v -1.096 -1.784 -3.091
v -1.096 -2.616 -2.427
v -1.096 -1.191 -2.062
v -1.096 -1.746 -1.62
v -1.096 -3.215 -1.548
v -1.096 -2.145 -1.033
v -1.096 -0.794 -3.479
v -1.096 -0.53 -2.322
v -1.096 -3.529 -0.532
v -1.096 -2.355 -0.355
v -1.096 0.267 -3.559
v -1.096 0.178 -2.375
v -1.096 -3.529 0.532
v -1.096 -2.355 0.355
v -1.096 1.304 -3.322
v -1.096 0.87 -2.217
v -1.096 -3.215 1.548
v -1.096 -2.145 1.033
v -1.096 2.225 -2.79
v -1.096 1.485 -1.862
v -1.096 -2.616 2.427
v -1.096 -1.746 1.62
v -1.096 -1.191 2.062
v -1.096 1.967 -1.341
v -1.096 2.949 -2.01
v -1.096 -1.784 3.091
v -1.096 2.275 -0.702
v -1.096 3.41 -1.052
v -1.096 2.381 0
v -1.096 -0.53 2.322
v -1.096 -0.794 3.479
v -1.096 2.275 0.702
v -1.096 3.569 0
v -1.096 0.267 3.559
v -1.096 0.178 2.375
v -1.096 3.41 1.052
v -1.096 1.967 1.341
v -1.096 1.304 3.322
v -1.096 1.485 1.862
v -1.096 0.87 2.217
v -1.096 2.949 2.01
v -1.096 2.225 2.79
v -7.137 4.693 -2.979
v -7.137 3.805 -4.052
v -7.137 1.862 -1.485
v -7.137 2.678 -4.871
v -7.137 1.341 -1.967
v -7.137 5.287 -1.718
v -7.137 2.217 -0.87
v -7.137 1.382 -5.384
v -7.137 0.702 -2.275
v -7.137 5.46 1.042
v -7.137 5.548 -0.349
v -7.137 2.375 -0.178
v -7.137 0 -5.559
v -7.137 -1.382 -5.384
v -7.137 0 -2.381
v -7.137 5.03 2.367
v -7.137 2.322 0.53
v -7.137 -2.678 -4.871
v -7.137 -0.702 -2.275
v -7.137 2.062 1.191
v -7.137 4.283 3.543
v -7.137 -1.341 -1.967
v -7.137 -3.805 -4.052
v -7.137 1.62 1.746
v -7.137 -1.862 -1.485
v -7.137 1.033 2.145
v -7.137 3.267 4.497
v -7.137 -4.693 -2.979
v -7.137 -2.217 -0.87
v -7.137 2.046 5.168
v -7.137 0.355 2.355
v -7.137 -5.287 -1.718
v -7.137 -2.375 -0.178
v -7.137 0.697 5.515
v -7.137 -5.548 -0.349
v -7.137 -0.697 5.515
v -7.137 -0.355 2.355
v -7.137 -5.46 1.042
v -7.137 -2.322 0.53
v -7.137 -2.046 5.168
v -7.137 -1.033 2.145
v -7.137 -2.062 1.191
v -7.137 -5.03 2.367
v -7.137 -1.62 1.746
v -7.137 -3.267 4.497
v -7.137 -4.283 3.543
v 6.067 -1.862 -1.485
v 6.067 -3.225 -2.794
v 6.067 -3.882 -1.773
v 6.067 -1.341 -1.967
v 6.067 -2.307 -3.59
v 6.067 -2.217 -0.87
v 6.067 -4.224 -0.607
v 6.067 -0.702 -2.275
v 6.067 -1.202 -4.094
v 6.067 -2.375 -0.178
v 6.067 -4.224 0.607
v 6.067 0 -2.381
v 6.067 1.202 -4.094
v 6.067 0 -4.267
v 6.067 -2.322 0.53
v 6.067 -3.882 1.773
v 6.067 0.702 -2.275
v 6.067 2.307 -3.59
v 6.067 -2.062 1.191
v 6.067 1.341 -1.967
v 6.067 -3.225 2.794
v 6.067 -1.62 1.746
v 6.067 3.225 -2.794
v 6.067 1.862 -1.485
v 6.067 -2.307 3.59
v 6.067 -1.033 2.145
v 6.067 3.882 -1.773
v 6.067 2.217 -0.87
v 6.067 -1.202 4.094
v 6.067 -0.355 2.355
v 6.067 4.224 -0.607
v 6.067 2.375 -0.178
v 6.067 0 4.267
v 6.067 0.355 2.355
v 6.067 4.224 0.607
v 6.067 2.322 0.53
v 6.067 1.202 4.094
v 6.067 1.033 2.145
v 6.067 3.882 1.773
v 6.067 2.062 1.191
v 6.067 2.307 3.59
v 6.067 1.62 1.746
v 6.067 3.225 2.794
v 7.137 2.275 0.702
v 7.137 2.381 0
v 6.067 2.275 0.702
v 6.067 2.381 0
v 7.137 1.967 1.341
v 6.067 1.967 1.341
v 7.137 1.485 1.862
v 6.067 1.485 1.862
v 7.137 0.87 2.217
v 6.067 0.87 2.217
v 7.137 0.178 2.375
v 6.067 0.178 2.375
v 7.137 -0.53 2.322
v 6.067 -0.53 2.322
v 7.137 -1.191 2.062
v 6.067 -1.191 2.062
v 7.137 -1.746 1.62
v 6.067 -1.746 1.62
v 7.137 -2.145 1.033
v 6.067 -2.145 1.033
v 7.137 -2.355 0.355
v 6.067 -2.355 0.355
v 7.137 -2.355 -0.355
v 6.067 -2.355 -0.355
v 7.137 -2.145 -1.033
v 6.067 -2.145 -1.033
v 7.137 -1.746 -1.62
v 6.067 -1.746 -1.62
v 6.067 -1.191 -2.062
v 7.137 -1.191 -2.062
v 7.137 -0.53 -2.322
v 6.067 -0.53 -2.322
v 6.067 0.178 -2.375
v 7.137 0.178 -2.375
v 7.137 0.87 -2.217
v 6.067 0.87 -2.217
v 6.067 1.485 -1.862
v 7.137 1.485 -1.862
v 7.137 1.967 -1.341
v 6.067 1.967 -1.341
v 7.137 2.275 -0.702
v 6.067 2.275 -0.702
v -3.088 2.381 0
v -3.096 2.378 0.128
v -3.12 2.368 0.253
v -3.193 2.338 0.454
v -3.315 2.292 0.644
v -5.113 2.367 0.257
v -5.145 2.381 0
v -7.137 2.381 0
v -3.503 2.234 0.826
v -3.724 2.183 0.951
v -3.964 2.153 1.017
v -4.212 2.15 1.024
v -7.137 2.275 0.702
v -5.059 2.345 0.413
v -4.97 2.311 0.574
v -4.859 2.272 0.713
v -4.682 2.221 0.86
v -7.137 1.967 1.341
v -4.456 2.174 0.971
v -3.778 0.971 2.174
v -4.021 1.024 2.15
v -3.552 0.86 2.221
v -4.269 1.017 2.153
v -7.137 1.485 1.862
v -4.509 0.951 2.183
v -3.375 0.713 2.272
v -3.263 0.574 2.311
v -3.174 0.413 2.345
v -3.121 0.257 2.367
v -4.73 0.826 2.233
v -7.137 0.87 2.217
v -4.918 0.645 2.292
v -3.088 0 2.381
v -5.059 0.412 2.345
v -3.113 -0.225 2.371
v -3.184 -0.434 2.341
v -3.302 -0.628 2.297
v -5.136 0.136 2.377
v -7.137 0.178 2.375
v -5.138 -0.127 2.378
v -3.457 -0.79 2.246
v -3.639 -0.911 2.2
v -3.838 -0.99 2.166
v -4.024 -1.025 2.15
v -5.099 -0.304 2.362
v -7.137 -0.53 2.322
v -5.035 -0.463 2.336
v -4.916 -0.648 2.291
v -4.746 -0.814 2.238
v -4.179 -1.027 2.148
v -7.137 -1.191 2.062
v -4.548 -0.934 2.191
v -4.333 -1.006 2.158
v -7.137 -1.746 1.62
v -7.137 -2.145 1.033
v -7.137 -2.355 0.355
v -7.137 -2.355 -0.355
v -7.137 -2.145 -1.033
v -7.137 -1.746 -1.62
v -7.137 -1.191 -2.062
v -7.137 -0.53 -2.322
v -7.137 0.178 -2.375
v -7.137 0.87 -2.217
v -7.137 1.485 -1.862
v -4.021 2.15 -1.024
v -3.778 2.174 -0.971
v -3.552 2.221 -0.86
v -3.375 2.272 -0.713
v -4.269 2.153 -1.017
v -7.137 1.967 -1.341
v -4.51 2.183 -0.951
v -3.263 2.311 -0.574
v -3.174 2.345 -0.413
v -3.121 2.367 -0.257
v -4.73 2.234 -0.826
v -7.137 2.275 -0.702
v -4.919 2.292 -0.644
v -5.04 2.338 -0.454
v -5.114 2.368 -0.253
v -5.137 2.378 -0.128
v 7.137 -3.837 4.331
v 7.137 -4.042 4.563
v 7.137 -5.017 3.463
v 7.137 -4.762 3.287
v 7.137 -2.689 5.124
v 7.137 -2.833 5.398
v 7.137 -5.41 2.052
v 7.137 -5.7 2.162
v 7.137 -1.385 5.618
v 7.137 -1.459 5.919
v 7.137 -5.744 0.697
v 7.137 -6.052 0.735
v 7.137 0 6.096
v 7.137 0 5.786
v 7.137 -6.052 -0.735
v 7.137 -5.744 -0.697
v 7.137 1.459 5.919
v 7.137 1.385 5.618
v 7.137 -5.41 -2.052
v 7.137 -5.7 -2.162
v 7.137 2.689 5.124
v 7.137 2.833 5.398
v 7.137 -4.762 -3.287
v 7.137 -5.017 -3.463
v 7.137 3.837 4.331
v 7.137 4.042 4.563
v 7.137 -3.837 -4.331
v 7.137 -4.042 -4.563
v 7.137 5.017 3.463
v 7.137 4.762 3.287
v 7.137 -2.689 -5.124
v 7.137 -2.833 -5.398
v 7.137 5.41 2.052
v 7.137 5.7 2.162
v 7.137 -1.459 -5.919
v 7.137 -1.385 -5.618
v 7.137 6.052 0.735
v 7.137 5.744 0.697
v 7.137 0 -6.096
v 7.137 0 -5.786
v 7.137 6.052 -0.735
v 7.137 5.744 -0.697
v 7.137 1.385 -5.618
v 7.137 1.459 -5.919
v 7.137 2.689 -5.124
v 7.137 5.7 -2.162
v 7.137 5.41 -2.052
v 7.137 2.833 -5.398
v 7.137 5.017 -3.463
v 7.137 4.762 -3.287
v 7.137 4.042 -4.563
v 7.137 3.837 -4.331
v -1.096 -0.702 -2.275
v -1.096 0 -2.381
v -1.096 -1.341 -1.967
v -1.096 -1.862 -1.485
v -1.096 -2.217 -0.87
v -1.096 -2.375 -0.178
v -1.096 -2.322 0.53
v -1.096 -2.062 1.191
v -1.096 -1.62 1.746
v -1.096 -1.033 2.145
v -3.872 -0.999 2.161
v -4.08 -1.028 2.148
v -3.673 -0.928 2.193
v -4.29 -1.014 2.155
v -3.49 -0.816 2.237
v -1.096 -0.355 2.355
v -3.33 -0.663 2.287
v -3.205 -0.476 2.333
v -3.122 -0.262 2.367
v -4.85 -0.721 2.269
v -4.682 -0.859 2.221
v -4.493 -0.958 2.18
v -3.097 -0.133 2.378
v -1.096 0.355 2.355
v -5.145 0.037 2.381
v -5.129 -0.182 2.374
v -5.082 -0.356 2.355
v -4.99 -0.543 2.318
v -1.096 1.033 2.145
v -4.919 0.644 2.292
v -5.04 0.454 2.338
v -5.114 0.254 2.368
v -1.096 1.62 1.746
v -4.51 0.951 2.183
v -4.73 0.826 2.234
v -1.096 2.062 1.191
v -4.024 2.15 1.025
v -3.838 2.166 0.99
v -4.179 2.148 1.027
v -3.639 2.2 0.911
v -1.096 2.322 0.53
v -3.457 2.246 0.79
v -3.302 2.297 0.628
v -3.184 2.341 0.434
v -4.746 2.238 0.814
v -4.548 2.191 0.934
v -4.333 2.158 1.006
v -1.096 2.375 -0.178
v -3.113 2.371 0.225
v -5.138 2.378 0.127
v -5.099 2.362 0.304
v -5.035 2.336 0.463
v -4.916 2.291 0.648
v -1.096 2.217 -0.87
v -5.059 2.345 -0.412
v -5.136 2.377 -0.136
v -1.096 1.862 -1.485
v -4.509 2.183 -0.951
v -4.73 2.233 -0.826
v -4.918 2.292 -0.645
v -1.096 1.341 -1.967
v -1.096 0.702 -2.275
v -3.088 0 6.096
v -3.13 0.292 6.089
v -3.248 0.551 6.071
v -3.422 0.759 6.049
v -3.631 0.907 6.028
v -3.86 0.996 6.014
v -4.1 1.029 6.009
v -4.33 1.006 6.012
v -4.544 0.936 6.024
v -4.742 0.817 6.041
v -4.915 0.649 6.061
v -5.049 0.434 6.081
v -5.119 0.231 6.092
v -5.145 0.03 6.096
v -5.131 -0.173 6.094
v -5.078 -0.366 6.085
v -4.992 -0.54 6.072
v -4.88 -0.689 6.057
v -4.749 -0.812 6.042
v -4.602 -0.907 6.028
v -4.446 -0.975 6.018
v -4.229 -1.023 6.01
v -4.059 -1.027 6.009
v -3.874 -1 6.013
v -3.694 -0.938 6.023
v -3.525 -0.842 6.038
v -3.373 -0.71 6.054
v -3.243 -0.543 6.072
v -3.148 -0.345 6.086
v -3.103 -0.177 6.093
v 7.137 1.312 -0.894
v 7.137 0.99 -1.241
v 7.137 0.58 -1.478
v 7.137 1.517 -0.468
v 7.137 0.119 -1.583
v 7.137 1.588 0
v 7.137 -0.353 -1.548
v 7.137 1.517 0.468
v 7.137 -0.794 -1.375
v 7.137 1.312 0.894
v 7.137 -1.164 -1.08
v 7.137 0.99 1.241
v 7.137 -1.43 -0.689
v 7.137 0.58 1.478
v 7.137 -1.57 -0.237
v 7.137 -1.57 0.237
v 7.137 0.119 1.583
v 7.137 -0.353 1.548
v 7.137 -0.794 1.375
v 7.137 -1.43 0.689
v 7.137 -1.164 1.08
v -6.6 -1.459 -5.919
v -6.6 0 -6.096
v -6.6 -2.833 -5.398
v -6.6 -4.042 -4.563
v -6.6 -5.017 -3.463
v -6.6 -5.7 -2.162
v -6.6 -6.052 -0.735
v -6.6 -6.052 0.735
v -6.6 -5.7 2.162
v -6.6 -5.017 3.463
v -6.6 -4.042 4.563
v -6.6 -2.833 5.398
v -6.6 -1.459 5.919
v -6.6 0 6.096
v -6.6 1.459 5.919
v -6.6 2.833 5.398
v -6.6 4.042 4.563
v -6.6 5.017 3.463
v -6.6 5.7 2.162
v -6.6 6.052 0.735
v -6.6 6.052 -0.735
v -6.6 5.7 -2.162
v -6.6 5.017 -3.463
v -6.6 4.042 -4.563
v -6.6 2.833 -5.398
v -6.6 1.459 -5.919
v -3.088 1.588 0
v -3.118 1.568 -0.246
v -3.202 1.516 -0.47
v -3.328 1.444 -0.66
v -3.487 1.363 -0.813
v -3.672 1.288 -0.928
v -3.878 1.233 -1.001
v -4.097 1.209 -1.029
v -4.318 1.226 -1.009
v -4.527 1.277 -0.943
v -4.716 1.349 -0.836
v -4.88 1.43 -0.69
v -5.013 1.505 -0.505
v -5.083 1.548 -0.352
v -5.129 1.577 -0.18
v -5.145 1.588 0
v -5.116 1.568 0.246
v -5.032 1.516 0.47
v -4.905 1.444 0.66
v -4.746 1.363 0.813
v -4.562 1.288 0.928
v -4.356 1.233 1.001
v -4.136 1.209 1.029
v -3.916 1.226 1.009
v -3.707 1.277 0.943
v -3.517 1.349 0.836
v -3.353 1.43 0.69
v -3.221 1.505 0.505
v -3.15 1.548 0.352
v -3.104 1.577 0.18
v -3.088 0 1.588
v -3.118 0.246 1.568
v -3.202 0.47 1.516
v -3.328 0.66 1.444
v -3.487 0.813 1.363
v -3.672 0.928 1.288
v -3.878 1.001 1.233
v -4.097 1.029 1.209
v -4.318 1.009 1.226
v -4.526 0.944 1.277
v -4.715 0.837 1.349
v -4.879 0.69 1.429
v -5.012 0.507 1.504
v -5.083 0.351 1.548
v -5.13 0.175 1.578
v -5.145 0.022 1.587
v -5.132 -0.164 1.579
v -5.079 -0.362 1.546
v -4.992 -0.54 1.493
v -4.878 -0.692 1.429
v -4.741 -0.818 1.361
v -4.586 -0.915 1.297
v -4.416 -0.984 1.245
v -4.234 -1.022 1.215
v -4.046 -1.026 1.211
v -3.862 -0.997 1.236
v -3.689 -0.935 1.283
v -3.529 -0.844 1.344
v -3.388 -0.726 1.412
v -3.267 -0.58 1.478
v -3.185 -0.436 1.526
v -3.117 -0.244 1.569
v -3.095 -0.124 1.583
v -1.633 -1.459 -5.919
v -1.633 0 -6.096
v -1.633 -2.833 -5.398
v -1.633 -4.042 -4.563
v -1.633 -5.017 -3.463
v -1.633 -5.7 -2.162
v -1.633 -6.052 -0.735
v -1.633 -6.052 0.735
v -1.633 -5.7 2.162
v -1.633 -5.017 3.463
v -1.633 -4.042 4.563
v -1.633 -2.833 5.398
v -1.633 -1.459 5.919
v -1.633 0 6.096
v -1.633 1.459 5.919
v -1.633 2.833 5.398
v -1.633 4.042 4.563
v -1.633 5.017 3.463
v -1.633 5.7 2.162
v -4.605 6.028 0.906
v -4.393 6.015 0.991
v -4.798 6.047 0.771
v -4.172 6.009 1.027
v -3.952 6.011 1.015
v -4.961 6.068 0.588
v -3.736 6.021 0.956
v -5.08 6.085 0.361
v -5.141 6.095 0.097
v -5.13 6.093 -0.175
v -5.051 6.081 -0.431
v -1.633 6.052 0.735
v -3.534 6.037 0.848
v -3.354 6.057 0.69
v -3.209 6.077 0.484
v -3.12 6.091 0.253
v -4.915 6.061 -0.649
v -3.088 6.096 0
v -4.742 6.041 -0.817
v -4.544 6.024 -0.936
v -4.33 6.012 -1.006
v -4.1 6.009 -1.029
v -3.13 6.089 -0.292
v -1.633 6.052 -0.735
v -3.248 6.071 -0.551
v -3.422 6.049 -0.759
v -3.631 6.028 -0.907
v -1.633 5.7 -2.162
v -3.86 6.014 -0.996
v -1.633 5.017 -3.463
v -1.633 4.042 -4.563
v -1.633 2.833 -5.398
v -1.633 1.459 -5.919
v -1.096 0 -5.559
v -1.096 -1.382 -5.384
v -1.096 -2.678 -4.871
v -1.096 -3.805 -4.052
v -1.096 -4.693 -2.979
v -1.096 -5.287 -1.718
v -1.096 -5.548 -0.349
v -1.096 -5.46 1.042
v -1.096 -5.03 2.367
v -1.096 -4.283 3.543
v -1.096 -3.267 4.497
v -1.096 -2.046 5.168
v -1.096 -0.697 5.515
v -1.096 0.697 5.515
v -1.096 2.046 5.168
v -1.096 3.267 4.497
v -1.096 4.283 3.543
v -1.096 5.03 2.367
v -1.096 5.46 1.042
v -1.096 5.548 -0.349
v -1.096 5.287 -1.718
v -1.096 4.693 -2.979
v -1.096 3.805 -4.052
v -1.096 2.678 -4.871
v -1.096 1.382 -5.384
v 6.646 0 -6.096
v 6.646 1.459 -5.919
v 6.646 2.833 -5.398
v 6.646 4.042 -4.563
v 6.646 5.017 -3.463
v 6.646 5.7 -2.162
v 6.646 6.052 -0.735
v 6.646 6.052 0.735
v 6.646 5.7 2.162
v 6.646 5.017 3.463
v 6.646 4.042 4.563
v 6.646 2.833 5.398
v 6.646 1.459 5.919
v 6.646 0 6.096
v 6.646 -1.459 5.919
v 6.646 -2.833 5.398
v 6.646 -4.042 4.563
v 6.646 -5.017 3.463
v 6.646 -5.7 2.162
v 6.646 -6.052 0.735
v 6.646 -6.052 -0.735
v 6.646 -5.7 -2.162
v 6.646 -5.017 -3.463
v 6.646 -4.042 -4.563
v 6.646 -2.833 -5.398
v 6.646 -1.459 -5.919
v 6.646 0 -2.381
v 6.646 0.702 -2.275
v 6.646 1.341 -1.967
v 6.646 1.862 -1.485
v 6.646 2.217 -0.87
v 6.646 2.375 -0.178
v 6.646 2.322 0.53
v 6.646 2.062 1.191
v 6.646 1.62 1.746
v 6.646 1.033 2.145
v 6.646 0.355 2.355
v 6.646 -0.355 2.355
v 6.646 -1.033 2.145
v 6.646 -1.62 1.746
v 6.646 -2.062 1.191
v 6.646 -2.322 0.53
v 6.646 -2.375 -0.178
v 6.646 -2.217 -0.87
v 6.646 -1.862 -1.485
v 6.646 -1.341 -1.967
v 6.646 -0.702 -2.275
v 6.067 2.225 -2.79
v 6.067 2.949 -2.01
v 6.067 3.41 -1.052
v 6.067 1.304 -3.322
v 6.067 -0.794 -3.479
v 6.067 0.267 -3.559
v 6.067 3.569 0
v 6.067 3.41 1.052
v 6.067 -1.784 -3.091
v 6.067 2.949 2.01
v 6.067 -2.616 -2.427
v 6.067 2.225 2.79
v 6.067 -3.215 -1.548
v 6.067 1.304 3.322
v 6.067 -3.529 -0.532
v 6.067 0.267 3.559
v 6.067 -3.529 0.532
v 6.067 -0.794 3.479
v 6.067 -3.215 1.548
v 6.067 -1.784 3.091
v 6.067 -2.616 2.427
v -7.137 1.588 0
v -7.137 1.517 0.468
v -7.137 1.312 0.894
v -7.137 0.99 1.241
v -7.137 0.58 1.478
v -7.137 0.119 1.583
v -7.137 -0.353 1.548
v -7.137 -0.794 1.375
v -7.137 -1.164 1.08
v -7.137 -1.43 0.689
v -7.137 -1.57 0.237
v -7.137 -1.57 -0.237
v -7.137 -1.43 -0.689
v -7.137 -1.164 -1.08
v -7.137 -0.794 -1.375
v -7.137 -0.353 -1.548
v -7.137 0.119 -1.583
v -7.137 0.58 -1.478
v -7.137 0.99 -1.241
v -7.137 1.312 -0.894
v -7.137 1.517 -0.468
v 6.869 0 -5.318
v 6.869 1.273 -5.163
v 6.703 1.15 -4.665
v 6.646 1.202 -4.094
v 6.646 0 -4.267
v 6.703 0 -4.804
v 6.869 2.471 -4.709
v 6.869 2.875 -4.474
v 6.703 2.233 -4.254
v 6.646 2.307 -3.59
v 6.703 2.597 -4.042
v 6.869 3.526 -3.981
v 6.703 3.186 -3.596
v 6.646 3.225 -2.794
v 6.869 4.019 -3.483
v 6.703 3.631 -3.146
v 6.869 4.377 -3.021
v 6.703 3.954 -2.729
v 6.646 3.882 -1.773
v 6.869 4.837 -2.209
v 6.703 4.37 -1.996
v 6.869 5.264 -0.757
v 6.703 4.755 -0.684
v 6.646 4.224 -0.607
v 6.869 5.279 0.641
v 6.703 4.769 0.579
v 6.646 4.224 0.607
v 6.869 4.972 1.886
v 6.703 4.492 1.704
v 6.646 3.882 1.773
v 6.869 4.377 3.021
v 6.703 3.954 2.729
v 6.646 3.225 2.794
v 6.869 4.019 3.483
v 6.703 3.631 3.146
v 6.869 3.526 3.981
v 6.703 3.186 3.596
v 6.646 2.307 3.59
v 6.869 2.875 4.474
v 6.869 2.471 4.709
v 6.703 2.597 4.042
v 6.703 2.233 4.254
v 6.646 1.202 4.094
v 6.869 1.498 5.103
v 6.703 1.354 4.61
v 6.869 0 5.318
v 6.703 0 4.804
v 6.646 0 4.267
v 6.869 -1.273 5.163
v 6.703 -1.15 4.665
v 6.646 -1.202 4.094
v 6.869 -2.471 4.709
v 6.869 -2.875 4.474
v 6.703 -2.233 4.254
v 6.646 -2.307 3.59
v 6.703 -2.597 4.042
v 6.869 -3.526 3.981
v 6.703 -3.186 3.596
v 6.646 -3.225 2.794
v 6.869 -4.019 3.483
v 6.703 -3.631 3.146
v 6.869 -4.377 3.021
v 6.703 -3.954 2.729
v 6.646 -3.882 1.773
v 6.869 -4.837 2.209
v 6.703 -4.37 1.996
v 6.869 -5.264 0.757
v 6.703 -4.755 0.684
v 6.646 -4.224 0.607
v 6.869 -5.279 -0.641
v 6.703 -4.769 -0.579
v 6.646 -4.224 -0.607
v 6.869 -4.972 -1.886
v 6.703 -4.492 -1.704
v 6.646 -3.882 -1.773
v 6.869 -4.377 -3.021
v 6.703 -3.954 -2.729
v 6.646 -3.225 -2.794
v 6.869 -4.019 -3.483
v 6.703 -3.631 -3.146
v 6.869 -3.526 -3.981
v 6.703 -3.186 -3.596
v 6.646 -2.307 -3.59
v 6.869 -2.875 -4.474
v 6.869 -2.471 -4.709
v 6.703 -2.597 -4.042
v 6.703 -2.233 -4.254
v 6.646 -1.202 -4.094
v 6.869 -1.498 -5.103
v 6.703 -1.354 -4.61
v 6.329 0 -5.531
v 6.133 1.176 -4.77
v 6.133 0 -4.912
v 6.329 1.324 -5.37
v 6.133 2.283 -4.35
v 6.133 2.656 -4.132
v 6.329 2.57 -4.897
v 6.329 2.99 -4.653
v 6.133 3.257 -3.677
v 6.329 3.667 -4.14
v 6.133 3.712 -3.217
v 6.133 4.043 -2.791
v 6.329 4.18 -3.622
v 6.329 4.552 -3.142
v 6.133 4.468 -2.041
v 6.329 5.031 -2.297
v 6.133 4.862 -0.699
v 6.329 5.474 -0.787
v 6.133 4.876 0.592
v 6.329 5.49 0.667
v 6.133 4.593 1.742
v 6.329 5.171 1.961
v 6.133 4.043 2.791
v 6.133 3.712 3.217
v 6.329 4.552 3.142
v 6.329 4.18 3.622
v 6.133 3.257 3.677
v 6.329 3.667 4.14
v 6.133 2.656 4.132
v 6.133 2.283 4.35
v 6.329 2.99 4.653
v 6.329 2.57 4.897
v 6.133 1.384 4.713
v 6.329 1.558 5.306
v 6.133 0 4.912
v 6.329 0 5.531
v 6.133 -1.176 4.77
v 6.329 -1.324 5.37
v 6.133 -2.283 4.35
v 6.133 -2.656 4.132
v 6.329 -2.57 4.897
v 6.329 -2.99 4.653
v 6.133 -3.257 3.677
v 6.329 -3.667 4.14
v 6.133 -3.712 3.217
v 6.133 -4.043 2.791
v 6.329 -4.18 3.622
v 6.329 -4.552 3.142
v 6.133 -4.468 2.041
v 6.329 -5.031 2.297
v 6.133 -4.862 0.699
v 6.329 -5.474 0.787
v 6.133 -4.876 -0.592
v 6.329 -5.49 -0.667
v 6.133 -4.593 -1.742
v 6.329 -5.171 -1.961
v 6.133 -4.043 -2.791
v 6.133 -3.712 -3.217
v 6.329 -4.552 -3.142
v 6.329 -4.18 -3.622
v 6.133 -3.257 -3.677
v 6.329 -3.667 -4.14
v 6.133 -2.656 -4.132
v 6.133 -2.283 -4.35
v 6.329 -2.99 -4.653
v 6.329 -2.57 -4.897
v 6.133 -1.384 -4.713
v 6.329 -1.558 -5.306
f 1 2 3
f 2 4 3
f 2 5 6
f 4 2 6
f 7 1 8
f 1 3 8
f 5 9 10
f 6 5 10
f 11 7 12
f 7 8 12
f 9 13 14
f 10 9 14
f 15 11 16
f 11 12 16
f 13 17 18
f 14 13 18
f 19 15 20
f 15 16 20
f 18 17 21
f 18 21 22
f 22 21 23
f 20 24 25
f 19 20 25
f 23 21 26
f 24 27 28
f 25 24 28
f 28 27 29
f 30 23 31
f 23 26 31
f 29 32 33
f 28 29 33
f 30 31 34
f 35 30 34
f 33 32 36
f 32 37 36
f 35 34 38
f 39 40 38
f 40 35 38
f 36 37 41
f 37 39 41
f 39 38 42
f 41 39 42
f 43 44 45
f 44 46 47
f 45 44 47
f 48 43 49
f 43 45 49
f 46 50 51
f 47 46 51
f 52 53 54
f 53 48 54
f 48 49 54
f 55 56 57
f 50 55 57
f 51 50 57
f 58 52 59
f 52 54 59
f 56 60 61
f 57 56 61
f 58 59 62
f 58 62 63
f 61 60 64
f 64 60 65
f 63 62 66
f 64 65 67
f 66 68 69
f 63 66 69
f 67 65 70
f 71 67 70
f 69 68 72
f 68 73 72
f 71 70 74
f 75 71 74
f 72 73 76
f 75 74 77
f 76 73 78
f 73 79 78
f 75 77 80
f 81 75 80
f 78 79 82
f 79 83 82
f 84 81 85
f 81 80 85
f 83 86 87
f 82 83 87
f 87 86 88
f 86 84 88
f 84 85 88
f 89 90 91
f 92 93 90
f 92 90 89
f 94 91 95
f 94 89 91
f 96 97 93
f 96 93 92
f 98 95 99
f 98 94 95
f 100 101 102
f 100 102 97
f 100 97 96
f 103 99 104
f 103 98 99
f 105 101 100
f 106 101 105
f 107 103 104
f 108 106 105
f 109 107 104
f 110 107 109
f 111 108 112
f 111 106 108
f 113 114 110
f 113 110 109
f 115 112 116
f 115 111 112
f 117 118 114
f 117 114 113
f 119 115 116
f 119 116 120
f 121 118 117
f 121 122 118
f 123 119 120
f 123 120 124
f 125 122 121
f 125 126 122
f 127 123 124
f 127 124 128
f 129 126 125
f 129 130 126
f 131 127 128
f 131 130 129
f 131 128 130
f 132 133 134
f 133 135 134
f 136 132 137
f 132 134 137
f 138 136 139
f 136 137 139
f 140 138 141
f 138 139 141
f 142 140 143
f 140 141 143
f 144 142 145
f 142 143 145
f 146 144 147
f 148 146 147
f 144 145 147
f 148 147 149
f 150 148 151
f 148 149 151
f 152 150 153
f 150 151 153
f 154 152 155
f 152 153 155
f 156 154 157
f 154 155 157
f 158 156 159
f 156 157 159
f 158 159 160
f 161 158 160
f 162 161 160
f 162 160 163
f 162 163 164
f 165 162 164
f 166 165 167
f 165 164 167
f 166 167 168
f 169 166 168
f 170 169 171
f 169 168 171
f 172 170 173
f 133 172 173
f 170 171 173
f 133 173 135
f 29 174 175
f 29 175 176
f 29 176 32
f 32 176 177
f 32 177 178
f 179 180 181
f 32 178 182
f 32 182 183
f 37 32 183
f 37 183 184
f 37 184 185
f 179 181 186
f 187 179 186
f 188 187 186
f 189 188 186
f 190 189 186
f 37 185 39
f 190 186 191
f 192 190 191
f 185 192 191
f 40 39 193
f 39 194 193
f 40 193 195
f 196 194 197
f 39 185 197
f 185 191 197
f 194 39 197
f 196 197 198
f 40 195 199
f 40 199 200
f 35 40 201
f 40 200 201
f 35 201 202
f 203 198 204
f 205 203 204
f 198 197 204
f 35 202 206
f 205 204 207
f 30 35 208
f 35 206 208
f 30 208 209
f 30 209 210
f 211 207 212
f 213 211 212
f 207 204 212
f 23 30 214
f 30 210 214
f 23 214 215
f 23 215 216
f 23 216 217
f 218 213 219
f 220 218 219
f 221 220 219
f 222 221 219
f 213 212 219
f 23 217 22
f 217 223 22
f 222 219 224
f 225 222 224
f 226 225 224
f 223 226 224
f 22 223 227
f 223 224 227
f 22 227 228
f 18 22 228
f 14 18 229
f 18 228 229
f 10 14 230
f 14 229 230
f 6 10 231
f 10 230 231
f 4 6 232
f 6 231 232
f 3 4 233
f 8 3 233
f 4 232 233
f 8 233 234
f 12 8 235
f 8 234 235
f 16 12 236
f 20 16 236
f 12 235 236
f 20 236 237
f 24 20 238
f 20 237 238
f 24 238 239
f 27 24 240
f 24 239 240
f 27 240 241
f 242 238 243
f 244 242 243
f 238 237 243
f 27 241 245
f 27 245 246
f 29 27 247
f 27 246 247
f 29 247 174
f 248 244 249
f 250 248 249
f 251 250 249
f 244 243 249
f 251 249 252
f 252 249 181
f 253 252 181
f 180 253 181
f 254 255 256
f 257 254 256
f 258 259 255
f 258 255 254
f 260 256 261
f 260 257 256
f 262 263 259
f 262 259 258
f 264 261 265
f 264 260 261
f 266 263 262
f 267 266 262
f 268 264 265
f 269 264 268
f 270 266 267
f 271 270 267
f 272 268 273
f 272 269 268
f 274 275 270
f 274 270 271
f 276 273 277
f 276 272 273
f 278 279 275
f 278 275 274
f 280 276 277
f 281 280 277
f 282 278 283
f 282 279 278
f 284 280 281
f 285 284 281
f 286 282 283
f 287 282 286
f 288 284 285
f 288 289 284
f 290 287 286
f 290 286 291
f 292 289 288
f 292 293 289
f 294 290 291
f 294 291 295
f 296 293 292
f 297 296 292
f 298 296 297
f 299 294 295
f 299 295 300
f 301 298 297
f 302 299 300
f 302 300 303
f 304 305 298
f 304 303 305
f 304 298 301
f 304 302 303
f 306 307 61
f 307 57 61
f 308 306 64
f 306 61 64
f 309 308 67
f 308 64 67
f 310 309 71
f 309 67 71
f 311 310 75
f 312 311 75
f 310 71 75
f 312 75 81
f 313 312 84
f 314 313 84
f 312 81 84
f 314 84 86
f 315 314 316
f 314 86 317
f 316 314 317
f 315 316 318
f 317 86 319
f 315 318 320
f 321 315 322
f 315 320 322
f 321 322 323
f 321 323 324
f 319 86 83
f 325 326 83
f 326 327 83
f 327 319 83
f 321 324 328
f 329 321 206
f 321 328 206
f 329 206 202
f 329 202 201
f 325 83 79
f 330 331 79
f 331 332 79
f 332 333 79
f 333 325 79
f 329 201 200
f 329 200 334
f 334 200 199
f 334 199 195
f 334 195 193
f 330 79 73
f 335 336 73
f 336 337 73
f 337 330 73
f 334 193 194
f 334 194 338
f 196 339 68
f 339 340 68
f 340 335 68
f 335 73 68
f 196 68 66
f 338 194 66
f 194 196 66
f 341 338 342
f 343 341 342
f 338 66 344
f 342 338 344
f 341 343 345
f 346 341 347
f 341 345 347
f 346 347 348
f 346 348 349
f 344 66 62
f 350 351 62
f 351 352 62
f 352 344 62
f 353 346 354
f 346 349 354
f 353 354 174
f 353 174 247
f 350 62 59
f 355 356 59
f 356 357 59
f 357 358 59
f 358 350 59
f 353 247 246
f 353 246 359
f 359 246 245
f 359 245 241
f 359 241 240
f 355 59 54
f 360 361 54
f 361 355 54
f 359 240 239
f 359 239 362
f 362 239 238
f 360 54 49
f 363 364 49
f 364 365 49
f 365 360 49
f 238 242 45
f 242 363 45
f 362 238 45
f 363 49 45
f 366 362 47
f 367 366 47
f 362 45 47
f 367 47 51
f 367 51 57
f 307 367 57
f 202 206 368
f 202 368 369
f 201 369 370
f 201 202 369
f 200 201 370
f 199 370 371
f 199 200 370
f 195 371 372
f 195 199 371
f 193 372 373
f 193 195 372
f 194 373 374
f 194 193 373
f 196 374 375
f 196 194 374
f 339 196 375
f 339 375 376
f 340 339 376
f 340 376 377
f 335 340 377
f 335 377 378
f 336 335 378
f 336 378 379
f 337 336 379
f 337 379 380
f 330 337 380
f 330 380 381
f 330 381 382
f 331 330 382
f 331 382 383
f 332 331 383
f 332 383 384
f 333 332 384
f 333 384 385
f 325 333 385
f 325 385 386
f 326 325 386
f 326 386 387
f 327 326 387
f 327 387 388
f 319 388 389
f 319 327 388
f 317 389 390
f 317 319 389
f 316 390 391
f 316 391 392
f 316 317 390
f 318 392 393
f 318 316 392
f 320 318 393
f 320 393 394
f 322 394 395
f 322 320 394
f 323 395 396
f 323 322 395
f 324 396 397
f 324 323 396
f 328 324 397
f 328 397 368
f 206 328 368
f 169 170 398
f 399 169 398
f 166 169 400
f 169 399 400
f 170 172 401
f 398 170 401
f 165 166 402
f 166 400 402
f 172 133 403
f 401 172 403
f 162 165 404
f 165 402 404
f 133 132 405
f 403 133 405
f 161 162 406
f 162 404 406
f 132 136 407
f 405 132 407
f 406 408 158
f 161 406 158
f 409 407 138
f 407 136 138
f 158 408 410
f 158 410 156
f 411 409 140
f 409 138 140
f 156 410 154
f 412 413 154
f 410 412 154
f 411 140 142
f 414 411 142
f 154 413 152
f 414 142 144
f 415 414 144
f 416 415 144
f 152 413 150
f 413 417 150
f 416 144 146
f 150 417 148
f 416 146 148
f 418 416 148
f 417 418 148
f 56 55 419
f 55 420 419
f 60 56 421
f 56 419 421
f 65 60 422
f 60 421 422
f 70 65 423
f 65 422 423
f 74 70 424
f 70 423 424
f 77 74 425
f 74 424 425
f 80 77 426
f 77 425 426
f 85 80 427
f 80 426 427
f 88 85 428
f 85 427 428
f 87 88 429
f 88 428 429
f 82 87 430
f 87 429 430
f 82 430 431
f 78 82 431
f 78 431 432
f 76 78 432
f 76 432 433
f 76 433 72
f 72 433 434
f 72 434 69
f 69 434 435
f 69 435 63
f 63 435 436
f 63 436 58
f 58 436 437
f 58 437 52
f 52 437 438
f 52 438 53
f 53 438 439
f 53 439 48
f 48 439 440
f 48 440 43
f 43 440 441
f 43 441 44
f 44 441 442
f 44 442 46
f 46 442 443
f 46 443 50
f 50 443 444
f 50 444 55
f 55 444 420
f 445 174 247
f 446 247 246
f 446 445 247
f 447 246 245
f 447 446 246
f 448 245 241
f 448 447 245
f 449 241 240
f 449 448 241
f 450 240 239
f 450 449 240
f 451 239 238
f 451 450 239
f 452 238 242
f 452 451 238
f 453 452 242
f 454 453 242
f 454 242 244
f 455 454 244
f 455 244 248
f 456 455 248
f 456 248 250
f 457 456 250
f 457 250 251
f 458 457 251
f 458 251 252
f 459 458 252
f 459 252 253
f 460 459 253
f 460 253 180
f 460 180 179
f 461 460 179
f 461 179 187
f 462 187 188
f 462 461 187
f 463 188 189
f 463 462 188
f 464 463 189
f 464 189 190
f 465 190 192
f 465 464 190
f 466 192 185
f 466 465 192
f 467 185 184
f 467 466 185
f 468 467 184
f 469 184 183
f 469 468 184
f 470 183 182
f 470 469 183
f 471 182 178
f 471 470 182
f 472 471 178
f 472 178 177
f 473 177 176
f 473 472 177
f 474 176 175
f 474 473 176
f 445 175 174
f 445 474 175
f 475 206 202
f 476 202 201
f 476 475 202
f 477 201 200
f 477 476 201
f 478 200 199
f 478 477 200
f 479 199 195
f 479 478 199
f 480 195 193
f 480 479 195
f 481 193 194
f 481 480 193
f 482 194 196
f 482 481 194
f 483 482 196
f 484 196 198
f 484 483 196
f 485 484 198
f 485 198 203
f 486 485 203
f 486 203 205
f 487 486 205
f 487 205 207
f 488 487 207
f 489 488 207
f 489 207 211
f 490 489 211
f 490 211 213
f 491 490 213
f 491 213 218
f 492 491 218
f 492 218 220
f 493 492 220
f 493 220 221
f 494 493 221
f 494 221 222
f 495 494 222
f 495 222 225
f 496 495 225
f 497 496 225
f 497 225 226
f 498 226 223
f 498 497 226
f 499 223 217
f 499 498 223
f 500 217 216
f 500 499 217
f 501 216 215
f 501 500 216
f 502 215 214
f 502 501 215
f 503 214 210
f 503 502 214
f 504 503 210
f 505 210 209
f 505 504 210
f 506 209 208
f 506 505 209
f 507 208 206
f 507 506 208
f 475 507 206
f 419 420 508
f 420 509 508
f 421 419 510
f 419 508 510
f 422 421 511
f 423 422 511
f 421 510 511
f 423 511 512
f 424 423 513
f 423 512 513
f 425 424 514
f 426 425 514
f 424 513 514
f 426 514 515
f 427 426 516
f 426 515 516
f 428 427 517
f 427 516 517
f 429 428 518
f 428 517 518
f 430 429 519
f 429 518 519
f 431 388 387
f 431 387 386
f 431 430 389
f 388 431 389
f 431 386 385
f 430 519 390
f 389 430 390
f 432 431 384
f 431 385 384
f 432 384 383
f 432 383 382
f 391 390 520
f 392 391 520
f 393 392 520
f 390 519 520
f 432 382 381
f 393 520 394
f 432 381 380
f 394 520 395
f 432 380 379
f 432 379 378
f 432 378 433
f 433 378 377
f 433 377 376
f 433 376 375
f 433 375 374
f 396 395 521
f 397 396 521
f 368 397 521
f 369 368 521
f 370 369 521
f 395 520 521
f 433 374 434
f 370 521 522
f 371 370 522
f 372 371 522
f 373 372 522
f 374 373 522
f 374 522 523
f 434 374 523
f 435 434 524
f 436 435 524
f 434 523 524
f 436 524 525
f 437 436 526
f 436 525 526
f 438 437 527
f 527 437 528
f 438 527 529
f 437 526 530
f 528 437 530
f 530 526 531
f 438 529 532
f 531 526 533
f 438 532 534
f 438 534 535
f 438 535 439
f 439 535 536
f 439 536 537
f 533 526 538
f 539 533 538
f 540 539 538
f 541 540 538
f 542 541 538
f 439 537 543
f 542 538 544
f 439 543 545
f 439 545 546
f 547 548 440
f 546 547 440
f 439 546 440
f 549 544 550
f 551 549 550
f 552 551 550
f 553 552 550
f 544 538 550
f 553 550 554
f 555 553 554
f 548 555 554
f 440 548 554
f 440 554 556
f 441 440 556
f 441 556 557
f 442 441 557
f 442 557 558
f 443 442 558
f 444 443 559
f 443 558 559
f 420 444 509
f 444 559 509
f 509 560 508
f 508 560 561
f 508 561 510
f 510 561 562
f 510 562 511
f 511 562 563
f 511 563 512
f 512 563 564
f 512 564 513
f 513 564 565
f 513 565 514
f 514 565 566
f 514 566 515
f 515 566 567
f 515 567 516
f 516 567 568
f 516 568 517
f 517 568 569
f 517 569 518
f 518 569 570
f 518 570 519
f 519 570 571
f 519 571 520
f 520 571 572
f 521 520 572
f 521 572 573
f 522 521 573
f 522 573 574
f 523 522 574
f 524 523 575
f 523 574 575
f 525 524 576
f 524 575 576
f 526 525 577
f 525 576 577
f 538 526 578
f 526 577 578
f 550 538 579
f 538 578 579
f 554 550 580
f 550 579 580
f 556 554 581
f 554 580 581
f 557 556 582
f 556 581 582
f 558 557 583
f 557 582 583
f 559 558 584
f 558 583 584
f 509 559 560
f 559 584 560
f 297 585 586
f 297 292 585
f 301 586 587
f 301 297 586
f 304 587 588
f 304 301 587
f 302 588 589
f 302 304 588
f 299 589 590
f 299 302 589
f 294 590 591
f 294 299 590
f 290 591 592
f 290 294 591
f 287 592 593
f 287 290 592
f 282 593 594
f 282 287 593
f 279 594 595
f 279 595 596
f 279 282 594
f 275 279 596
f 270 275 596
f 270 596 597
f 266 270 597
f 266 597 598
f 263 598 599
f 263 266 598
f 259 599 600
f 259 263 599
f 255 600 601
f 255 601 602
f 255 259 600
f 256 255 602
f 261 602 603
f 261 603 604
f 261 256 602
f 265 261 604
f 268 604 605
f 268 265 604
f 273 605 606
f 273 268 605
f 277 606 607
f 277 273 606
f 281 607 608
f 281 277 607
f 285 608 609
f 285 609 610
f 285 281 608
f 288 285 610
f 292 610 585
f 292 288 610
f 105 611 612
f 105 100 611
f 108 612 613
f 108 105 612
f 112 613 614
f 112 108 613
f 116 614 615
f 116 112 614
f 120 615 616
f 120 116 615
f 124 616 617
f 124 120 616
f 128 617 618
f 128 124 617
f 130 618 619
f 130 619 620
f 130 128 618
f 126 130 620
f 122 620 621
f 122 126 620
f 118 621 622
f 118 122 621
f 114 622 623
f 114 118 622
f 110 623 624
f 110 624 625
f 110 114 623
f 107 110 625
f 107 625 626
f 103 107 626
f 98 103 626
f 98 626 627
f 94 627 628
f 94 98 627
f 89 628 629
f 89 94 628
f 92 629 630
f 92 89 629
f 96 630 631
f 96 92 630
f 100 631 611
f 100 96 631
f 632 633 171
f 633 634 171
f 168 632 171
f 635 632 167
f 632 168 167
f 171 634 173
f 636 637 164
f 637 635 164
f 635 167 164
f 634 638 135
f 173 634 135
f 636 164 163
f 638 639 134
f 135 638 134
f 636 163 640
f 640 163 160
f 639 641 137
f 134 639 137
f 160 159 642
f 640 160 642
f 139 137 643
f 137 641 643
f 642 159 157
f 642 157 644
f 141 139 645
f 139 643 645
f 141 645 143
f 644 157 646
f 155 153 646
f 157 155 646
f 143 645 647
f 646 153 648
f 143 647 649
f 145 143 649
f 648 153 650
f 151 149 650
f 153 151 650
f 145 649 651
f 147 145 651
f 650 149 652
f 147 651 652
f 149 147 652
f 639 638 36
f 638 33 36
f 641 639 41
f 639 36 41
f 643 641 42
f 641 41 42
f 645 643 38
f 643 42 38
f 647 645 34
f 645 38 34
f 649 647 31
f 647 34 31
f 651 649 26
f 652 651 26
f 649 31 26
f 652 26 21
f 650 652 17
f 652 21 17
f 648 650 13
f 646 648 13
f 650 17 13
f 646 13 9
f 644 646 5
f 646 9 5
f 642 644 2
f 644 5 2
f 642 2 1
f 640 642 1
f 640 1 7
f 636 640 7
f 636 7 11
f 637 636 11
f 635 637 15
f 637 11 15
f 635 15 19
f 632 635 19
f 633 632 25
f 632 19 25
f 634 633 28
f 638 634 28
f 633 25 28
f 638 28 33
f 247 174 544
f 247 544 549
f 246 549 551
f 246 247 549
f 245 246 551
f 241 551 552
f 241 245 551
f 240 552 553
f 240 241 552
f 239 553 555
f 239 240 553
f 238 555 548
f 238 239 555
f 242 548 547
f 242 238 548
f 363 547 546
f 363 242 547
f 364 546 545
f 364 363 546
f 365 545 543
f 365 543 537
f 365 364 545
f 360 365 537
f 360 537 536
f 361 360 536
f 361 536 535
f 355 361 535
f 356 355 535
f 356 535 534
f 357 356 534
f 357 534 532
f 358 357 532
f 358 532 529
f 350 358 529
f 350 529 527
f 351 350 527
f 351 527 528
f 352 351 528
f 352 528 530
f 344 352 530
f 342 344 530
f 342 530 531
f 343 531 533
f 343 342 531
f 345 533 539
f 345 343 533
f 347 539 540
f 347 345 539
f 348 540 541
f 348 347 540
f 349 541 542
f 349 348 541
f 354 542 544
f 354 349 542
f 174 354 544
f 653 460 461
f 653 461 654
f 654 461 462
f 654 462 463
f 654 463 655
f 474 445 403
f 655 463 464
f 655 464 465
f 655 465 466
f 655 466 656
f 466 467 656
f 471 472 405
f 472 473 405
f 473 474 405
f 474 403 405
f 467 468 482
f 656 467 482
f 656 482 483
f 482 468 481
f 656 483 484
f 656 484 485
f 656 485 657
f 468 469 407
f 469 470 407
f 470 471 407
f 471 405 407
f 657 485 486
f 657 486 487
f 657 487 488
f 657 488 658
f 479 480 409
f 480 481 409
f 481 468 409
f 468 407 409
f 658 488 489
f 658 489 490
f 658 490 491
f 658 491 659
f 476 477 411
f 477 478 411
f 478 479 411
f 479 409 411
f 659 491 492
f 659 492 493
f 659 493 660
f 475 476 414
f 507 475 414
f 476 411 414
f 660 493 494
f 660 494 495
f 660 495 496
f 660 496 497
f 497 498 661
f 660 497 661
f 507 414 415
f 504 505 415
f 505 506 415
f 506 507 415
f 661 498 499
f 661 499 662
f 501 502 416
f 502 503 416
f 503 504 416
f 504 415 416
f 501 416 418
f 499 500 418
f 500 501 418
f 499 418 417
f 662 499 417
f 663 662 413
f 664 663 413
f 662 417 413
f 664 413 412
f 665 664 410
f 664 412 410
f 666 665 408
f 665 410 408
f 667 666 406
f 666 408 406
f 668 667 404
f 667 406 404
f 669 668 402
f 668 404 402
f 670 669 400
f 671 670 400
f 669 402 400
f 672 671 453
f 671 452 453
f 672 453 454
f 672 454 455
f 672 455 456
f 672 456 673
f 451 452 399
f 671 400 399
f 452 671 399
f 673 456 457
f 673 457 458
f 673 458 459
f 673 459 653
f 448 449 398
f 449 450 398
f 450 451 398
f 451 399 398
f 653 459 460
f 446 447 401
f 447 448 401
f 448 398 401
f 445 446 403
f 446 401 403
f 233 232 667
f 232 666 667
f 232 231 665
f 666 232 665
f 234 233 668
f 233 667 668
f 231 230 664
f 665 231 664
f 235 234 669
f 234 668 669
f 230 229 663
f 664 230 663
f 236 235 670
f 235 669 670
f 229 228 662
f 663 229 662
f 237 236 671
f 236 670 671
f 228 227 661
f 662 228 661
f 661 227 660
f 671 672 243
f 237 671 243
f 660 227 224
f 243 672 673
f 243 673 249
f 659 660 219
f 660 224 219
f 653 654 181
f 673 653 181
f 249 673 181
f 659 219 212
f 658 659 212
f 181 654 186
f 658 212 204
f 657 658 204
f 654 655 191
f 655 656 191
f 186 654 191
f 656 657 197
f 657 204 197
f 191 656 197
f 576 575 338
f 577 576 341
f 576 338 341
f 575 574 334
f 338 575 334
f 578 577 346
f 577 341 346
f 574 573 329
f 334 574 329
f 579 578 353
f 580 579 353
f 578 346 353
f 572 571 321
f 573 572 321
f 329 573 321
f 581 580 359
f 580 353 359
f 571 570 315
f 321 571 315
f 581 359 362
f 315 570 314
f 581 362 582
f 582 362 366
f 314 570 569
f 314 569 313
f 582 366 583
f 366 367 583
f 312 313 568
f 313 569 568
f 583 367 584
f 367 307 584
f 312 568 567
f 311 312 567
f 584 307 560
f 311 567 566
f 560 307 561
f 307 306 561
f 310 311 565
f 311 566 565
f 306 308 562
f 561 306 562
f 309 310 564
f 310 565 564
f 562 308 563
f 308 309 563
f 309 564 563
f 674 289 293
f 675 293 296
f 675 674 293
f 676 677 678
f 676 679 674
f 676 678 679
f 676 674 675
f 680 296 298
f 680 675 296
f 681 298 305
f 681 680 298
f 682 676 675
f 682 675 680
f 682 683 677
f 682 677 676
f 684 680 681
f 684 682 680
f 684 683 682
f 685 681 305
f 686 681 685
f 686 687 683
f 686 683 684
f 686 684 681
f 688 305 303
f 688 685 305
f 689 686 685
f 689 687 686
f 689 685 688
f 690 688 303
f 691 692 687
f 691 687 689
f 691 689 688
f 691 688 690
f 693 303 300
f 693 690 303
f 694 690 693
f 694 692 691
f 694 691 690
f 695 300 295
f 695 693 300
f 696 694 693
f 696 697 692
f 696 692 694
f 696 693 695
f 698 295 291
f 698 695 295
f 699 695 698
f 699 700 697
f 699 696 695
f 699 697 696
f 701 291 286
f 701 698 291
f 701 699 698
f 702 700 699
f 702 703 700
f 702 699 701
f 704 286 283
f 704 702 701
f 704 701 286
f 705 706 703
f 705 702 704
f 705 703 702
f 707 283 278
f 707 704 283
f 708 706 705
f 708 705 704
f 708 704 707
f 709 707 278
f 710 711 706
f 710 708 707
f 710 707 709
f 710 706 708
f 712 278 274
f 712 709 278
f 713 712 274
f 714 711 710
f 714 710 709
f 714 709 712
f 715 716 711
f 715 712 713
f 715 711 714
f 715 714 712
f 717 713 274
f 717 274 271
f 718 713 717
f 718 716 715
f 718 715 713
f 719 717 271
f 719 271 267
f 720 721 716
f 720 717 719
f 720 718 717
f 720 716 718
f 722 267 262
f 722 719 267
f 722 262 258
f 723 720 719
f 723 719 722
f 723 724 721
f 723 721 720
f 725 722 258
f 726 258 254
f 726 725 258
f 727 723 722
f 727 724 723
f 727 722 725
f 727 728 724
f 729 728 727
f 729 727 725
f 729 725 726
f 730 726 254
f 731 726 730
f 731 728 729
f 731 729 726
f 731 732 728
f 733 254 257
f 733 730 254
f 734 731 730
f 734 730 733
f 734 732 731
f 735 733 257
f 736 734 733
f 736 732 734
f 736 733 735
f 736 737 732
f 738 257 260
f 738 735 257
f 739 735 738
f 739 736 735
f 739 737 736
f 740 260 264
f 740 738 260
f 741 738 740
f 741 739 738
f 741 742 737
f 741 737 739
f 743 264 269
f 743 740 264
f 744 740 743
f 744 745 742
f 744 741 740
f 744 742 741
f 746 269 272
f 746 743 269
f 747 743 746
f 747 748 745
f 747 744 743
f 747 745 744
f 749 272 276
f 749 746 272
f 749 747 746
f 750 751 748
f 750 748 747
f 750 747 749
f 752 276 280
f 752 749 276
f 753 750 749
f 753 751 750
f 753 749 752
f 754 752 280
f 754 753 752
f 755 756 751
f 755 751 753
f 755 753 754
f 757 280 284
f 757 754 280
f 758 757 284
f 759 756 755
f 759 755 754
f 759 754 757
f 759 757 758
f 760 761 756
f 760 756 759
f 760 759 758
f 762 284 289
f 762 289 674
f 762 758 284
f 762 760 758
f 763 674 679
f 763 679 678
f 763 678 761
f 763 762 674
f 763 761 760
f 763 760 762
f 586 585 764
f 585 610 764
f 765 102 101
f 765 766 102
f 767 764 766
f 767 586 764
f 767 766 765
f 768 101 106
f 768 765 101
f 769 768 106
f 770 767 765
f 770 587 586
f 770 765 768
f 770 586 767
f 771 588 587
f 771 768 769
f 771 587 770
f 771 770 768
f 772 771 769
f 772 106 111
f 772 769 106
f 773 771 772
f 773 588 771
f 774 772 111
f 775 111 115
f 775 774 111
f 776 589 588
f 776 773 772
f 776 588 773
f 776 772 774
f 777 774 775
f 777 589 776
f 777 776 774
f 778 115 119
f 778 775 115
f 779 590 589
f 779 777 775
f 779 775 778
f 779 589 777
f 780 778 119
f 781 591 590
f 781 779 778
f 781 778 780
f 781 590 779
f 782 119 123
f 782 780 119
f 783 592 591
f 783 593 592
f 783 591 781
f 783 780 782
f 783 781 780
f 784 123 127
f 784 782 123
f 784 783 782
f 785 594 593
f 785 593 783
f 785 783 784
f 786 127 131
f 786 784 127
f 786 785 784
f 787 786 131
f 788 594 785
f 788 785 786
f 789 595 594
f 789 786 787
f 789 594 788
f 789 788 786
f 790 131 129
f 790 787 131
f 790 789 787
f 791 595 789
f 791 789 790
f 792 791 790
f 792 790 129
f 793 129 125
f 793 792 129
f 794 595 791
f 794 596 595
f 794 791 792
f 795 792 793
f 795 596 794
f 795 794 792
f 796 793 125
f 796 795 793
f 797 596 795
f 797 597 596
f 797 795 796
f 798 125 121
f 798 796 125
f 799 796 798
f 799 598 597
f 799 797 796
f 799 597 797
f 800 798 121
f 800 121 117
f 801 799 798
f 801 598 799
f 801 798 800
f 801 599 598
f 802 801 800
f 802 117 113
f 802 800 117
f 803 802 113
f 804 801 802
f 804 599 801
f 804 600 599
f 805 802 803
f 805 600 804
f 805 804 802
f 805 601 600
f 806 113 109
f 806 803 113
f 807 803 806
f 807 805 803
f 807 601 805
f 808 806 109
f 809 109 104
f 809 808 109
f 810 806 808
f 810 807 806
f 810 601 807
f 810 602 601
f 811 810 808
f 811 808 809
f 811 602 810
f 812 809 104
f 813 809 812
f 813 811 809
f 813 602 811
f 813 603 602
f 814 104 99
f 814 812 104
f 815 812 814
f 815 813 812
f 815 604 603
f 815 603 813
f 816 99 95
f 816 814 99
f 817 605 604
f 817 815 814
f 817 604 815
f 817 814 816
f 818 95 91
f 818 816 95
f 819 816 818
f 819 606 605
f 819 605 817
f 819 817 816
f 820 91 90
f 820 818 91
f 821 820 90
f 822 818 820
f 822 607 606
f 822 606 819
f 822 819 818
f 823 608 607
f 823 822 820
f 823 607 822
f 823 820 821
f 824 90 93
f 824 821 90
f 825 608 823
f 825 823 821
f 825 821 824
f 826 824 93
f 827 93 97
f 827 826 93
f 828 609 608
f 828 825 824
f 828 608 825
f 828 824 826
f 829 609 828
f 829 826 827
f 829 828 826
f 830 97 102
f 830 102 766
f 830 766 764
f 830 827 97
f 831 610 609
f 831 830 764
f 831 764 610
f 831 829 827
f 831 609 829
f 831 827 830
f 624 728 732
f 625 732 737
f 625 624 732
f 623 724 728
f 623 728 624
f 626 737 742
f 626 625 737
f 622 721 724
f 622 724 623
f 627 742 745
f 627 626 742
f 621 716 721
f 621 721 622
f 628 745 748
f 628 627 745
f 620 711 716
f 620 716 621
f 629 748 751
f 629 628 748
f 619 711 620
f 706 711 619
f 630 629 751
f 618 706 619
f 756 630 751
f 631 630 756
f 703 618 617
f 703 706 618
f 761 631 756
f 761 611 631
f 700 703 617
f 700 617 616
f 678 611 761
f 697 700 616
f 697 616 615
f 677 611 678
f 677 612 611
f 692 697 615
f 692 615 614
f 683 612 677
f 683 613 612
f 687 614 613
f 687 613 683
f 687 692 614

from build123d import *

# Parameters (mm, degrees)
SKETCH5_R         = 1.0287
SET_SCREWS_DEPTH  = 10
CIRPATTERN1_COUNT = 2
CIRPATTERN1_ANGLE = 90


with BuildPart() as part:
    # Sketch2 → Base Body (revolve)
    with BuildSketch(Plane.XY):
        Polygon((-7.1374, 1.5875), (7.1374, 1.5875), (7.1374, 2.38125), (6.06679, 2.38125), (6.06679, 3.5687), (-1.09601, 3.5687), (-1.09601, 2.38125), (-7.1374, 2.38125), align=None)
    revolve(axis=Axis((-7.1374, 0, 0), (1, 0, 0)))


with BuildPart() as body_2:
    # Sketch3 → Hub (revolve)
    with BuildSketch(Plane(origin=(0, 0, 0), x_dir=(1, 0, 0), z_dir=(0, 1, 0))):
        Polygon((-1.09601, 2.38125), (-7.1374, 2.38125), (-7.1374, 5.55879), (-6.60019, 6.096), (-1.63322, 6.096), (-1.09601, 5.55879), align=None)
    revolve(axis=Axis((0, 0, 0), (-1, 0, 0)))


with BuildPart() as body_3:
    # Sketch4 → Flange (revolve)
    with BuildSketch(Plane(origin=(0, 0, 0), x_dir=(1, 0, 0), z_dir=(0, 1, 0))):
        with BuildLine():
            Line((6.06679, 2.38125), (6.06679, 4.2672))
            ThreePointArc((6.06679, 4.2672), (6.215155829, 5.226423955), (6.646387226, 6.096))
            Line((6.646387226, 6.096), (7.1374, 6.096))
            Line((7.1374, 6.096), (7.1374, 5.786297853))
            ThreePointArc((7.1374, 5.786297853), (6.772189303, 5.065440539), (6.646387226, 4.2672))
            Line((6.646387226, 4.2672), (6.646387226, 2.38125))
            Line((6.646387226, 2.38125), (6.06679, 2.38125))
        make_face()
    revolve(axis=Axis((0, 0, 0), (1, 0, 0)))


with BuildPart() as set_screws_tool:
    # Sketch5 → Set Screws (new body)
    with BuildSketch(Plane(origin=(0, 0, 0), x_dir=(1, 0, 0), z_dir=(0, 1, 0))):
        with Locations((-4.116705, 0)):
            Circle(SKETCH5_R)
    set_screws = extrude(amount=SET_SCREWS_DEPTH)


with BuildPart() as part_1:
    add(part.part)

    # Set Screws: cut by set_screws_tool
    add(set_screws_tool.part, mode=Mode.SUBTRACT)


with BuildPart() as body_2_1:
    add(body_2.part)

    # Set Screws: cut by set_screws_tool
    add(set_screws_tool.part, mode=Mode.SUBTRACT)


with BuildPart() as cirpattern1_tool:
    # CirPattern1: Set Screws ×2 about axis
    cirpattern1_axis = Axis((-7.1374, 0, 0), (1, 0, 0))
    for i in range(1, CIRPATTERN1_COUNT):
        add(set_screws.rotate(cirpattern1_axis, i * CIRPATTERN1_ANGLE / (CIRPATTERN1_COUNT - 1)))


with BuildPart() as part_2:
    add(part_1.part)

    # CirPattern1: cut by cirpattern1_tool
    add(cirpattern1_tool.part, mode=Mode.SUBTRACT)


with BuildPart() as body_2_2:
    add(body_2_1.part)

    # CirPattern1: cut by cirpattern1_tool
    add(cirpattern1_tool.part, mode=Mode.SUBTRACT)


solid = Compound([body_3.part, part_2.part, body_2_2.part])
